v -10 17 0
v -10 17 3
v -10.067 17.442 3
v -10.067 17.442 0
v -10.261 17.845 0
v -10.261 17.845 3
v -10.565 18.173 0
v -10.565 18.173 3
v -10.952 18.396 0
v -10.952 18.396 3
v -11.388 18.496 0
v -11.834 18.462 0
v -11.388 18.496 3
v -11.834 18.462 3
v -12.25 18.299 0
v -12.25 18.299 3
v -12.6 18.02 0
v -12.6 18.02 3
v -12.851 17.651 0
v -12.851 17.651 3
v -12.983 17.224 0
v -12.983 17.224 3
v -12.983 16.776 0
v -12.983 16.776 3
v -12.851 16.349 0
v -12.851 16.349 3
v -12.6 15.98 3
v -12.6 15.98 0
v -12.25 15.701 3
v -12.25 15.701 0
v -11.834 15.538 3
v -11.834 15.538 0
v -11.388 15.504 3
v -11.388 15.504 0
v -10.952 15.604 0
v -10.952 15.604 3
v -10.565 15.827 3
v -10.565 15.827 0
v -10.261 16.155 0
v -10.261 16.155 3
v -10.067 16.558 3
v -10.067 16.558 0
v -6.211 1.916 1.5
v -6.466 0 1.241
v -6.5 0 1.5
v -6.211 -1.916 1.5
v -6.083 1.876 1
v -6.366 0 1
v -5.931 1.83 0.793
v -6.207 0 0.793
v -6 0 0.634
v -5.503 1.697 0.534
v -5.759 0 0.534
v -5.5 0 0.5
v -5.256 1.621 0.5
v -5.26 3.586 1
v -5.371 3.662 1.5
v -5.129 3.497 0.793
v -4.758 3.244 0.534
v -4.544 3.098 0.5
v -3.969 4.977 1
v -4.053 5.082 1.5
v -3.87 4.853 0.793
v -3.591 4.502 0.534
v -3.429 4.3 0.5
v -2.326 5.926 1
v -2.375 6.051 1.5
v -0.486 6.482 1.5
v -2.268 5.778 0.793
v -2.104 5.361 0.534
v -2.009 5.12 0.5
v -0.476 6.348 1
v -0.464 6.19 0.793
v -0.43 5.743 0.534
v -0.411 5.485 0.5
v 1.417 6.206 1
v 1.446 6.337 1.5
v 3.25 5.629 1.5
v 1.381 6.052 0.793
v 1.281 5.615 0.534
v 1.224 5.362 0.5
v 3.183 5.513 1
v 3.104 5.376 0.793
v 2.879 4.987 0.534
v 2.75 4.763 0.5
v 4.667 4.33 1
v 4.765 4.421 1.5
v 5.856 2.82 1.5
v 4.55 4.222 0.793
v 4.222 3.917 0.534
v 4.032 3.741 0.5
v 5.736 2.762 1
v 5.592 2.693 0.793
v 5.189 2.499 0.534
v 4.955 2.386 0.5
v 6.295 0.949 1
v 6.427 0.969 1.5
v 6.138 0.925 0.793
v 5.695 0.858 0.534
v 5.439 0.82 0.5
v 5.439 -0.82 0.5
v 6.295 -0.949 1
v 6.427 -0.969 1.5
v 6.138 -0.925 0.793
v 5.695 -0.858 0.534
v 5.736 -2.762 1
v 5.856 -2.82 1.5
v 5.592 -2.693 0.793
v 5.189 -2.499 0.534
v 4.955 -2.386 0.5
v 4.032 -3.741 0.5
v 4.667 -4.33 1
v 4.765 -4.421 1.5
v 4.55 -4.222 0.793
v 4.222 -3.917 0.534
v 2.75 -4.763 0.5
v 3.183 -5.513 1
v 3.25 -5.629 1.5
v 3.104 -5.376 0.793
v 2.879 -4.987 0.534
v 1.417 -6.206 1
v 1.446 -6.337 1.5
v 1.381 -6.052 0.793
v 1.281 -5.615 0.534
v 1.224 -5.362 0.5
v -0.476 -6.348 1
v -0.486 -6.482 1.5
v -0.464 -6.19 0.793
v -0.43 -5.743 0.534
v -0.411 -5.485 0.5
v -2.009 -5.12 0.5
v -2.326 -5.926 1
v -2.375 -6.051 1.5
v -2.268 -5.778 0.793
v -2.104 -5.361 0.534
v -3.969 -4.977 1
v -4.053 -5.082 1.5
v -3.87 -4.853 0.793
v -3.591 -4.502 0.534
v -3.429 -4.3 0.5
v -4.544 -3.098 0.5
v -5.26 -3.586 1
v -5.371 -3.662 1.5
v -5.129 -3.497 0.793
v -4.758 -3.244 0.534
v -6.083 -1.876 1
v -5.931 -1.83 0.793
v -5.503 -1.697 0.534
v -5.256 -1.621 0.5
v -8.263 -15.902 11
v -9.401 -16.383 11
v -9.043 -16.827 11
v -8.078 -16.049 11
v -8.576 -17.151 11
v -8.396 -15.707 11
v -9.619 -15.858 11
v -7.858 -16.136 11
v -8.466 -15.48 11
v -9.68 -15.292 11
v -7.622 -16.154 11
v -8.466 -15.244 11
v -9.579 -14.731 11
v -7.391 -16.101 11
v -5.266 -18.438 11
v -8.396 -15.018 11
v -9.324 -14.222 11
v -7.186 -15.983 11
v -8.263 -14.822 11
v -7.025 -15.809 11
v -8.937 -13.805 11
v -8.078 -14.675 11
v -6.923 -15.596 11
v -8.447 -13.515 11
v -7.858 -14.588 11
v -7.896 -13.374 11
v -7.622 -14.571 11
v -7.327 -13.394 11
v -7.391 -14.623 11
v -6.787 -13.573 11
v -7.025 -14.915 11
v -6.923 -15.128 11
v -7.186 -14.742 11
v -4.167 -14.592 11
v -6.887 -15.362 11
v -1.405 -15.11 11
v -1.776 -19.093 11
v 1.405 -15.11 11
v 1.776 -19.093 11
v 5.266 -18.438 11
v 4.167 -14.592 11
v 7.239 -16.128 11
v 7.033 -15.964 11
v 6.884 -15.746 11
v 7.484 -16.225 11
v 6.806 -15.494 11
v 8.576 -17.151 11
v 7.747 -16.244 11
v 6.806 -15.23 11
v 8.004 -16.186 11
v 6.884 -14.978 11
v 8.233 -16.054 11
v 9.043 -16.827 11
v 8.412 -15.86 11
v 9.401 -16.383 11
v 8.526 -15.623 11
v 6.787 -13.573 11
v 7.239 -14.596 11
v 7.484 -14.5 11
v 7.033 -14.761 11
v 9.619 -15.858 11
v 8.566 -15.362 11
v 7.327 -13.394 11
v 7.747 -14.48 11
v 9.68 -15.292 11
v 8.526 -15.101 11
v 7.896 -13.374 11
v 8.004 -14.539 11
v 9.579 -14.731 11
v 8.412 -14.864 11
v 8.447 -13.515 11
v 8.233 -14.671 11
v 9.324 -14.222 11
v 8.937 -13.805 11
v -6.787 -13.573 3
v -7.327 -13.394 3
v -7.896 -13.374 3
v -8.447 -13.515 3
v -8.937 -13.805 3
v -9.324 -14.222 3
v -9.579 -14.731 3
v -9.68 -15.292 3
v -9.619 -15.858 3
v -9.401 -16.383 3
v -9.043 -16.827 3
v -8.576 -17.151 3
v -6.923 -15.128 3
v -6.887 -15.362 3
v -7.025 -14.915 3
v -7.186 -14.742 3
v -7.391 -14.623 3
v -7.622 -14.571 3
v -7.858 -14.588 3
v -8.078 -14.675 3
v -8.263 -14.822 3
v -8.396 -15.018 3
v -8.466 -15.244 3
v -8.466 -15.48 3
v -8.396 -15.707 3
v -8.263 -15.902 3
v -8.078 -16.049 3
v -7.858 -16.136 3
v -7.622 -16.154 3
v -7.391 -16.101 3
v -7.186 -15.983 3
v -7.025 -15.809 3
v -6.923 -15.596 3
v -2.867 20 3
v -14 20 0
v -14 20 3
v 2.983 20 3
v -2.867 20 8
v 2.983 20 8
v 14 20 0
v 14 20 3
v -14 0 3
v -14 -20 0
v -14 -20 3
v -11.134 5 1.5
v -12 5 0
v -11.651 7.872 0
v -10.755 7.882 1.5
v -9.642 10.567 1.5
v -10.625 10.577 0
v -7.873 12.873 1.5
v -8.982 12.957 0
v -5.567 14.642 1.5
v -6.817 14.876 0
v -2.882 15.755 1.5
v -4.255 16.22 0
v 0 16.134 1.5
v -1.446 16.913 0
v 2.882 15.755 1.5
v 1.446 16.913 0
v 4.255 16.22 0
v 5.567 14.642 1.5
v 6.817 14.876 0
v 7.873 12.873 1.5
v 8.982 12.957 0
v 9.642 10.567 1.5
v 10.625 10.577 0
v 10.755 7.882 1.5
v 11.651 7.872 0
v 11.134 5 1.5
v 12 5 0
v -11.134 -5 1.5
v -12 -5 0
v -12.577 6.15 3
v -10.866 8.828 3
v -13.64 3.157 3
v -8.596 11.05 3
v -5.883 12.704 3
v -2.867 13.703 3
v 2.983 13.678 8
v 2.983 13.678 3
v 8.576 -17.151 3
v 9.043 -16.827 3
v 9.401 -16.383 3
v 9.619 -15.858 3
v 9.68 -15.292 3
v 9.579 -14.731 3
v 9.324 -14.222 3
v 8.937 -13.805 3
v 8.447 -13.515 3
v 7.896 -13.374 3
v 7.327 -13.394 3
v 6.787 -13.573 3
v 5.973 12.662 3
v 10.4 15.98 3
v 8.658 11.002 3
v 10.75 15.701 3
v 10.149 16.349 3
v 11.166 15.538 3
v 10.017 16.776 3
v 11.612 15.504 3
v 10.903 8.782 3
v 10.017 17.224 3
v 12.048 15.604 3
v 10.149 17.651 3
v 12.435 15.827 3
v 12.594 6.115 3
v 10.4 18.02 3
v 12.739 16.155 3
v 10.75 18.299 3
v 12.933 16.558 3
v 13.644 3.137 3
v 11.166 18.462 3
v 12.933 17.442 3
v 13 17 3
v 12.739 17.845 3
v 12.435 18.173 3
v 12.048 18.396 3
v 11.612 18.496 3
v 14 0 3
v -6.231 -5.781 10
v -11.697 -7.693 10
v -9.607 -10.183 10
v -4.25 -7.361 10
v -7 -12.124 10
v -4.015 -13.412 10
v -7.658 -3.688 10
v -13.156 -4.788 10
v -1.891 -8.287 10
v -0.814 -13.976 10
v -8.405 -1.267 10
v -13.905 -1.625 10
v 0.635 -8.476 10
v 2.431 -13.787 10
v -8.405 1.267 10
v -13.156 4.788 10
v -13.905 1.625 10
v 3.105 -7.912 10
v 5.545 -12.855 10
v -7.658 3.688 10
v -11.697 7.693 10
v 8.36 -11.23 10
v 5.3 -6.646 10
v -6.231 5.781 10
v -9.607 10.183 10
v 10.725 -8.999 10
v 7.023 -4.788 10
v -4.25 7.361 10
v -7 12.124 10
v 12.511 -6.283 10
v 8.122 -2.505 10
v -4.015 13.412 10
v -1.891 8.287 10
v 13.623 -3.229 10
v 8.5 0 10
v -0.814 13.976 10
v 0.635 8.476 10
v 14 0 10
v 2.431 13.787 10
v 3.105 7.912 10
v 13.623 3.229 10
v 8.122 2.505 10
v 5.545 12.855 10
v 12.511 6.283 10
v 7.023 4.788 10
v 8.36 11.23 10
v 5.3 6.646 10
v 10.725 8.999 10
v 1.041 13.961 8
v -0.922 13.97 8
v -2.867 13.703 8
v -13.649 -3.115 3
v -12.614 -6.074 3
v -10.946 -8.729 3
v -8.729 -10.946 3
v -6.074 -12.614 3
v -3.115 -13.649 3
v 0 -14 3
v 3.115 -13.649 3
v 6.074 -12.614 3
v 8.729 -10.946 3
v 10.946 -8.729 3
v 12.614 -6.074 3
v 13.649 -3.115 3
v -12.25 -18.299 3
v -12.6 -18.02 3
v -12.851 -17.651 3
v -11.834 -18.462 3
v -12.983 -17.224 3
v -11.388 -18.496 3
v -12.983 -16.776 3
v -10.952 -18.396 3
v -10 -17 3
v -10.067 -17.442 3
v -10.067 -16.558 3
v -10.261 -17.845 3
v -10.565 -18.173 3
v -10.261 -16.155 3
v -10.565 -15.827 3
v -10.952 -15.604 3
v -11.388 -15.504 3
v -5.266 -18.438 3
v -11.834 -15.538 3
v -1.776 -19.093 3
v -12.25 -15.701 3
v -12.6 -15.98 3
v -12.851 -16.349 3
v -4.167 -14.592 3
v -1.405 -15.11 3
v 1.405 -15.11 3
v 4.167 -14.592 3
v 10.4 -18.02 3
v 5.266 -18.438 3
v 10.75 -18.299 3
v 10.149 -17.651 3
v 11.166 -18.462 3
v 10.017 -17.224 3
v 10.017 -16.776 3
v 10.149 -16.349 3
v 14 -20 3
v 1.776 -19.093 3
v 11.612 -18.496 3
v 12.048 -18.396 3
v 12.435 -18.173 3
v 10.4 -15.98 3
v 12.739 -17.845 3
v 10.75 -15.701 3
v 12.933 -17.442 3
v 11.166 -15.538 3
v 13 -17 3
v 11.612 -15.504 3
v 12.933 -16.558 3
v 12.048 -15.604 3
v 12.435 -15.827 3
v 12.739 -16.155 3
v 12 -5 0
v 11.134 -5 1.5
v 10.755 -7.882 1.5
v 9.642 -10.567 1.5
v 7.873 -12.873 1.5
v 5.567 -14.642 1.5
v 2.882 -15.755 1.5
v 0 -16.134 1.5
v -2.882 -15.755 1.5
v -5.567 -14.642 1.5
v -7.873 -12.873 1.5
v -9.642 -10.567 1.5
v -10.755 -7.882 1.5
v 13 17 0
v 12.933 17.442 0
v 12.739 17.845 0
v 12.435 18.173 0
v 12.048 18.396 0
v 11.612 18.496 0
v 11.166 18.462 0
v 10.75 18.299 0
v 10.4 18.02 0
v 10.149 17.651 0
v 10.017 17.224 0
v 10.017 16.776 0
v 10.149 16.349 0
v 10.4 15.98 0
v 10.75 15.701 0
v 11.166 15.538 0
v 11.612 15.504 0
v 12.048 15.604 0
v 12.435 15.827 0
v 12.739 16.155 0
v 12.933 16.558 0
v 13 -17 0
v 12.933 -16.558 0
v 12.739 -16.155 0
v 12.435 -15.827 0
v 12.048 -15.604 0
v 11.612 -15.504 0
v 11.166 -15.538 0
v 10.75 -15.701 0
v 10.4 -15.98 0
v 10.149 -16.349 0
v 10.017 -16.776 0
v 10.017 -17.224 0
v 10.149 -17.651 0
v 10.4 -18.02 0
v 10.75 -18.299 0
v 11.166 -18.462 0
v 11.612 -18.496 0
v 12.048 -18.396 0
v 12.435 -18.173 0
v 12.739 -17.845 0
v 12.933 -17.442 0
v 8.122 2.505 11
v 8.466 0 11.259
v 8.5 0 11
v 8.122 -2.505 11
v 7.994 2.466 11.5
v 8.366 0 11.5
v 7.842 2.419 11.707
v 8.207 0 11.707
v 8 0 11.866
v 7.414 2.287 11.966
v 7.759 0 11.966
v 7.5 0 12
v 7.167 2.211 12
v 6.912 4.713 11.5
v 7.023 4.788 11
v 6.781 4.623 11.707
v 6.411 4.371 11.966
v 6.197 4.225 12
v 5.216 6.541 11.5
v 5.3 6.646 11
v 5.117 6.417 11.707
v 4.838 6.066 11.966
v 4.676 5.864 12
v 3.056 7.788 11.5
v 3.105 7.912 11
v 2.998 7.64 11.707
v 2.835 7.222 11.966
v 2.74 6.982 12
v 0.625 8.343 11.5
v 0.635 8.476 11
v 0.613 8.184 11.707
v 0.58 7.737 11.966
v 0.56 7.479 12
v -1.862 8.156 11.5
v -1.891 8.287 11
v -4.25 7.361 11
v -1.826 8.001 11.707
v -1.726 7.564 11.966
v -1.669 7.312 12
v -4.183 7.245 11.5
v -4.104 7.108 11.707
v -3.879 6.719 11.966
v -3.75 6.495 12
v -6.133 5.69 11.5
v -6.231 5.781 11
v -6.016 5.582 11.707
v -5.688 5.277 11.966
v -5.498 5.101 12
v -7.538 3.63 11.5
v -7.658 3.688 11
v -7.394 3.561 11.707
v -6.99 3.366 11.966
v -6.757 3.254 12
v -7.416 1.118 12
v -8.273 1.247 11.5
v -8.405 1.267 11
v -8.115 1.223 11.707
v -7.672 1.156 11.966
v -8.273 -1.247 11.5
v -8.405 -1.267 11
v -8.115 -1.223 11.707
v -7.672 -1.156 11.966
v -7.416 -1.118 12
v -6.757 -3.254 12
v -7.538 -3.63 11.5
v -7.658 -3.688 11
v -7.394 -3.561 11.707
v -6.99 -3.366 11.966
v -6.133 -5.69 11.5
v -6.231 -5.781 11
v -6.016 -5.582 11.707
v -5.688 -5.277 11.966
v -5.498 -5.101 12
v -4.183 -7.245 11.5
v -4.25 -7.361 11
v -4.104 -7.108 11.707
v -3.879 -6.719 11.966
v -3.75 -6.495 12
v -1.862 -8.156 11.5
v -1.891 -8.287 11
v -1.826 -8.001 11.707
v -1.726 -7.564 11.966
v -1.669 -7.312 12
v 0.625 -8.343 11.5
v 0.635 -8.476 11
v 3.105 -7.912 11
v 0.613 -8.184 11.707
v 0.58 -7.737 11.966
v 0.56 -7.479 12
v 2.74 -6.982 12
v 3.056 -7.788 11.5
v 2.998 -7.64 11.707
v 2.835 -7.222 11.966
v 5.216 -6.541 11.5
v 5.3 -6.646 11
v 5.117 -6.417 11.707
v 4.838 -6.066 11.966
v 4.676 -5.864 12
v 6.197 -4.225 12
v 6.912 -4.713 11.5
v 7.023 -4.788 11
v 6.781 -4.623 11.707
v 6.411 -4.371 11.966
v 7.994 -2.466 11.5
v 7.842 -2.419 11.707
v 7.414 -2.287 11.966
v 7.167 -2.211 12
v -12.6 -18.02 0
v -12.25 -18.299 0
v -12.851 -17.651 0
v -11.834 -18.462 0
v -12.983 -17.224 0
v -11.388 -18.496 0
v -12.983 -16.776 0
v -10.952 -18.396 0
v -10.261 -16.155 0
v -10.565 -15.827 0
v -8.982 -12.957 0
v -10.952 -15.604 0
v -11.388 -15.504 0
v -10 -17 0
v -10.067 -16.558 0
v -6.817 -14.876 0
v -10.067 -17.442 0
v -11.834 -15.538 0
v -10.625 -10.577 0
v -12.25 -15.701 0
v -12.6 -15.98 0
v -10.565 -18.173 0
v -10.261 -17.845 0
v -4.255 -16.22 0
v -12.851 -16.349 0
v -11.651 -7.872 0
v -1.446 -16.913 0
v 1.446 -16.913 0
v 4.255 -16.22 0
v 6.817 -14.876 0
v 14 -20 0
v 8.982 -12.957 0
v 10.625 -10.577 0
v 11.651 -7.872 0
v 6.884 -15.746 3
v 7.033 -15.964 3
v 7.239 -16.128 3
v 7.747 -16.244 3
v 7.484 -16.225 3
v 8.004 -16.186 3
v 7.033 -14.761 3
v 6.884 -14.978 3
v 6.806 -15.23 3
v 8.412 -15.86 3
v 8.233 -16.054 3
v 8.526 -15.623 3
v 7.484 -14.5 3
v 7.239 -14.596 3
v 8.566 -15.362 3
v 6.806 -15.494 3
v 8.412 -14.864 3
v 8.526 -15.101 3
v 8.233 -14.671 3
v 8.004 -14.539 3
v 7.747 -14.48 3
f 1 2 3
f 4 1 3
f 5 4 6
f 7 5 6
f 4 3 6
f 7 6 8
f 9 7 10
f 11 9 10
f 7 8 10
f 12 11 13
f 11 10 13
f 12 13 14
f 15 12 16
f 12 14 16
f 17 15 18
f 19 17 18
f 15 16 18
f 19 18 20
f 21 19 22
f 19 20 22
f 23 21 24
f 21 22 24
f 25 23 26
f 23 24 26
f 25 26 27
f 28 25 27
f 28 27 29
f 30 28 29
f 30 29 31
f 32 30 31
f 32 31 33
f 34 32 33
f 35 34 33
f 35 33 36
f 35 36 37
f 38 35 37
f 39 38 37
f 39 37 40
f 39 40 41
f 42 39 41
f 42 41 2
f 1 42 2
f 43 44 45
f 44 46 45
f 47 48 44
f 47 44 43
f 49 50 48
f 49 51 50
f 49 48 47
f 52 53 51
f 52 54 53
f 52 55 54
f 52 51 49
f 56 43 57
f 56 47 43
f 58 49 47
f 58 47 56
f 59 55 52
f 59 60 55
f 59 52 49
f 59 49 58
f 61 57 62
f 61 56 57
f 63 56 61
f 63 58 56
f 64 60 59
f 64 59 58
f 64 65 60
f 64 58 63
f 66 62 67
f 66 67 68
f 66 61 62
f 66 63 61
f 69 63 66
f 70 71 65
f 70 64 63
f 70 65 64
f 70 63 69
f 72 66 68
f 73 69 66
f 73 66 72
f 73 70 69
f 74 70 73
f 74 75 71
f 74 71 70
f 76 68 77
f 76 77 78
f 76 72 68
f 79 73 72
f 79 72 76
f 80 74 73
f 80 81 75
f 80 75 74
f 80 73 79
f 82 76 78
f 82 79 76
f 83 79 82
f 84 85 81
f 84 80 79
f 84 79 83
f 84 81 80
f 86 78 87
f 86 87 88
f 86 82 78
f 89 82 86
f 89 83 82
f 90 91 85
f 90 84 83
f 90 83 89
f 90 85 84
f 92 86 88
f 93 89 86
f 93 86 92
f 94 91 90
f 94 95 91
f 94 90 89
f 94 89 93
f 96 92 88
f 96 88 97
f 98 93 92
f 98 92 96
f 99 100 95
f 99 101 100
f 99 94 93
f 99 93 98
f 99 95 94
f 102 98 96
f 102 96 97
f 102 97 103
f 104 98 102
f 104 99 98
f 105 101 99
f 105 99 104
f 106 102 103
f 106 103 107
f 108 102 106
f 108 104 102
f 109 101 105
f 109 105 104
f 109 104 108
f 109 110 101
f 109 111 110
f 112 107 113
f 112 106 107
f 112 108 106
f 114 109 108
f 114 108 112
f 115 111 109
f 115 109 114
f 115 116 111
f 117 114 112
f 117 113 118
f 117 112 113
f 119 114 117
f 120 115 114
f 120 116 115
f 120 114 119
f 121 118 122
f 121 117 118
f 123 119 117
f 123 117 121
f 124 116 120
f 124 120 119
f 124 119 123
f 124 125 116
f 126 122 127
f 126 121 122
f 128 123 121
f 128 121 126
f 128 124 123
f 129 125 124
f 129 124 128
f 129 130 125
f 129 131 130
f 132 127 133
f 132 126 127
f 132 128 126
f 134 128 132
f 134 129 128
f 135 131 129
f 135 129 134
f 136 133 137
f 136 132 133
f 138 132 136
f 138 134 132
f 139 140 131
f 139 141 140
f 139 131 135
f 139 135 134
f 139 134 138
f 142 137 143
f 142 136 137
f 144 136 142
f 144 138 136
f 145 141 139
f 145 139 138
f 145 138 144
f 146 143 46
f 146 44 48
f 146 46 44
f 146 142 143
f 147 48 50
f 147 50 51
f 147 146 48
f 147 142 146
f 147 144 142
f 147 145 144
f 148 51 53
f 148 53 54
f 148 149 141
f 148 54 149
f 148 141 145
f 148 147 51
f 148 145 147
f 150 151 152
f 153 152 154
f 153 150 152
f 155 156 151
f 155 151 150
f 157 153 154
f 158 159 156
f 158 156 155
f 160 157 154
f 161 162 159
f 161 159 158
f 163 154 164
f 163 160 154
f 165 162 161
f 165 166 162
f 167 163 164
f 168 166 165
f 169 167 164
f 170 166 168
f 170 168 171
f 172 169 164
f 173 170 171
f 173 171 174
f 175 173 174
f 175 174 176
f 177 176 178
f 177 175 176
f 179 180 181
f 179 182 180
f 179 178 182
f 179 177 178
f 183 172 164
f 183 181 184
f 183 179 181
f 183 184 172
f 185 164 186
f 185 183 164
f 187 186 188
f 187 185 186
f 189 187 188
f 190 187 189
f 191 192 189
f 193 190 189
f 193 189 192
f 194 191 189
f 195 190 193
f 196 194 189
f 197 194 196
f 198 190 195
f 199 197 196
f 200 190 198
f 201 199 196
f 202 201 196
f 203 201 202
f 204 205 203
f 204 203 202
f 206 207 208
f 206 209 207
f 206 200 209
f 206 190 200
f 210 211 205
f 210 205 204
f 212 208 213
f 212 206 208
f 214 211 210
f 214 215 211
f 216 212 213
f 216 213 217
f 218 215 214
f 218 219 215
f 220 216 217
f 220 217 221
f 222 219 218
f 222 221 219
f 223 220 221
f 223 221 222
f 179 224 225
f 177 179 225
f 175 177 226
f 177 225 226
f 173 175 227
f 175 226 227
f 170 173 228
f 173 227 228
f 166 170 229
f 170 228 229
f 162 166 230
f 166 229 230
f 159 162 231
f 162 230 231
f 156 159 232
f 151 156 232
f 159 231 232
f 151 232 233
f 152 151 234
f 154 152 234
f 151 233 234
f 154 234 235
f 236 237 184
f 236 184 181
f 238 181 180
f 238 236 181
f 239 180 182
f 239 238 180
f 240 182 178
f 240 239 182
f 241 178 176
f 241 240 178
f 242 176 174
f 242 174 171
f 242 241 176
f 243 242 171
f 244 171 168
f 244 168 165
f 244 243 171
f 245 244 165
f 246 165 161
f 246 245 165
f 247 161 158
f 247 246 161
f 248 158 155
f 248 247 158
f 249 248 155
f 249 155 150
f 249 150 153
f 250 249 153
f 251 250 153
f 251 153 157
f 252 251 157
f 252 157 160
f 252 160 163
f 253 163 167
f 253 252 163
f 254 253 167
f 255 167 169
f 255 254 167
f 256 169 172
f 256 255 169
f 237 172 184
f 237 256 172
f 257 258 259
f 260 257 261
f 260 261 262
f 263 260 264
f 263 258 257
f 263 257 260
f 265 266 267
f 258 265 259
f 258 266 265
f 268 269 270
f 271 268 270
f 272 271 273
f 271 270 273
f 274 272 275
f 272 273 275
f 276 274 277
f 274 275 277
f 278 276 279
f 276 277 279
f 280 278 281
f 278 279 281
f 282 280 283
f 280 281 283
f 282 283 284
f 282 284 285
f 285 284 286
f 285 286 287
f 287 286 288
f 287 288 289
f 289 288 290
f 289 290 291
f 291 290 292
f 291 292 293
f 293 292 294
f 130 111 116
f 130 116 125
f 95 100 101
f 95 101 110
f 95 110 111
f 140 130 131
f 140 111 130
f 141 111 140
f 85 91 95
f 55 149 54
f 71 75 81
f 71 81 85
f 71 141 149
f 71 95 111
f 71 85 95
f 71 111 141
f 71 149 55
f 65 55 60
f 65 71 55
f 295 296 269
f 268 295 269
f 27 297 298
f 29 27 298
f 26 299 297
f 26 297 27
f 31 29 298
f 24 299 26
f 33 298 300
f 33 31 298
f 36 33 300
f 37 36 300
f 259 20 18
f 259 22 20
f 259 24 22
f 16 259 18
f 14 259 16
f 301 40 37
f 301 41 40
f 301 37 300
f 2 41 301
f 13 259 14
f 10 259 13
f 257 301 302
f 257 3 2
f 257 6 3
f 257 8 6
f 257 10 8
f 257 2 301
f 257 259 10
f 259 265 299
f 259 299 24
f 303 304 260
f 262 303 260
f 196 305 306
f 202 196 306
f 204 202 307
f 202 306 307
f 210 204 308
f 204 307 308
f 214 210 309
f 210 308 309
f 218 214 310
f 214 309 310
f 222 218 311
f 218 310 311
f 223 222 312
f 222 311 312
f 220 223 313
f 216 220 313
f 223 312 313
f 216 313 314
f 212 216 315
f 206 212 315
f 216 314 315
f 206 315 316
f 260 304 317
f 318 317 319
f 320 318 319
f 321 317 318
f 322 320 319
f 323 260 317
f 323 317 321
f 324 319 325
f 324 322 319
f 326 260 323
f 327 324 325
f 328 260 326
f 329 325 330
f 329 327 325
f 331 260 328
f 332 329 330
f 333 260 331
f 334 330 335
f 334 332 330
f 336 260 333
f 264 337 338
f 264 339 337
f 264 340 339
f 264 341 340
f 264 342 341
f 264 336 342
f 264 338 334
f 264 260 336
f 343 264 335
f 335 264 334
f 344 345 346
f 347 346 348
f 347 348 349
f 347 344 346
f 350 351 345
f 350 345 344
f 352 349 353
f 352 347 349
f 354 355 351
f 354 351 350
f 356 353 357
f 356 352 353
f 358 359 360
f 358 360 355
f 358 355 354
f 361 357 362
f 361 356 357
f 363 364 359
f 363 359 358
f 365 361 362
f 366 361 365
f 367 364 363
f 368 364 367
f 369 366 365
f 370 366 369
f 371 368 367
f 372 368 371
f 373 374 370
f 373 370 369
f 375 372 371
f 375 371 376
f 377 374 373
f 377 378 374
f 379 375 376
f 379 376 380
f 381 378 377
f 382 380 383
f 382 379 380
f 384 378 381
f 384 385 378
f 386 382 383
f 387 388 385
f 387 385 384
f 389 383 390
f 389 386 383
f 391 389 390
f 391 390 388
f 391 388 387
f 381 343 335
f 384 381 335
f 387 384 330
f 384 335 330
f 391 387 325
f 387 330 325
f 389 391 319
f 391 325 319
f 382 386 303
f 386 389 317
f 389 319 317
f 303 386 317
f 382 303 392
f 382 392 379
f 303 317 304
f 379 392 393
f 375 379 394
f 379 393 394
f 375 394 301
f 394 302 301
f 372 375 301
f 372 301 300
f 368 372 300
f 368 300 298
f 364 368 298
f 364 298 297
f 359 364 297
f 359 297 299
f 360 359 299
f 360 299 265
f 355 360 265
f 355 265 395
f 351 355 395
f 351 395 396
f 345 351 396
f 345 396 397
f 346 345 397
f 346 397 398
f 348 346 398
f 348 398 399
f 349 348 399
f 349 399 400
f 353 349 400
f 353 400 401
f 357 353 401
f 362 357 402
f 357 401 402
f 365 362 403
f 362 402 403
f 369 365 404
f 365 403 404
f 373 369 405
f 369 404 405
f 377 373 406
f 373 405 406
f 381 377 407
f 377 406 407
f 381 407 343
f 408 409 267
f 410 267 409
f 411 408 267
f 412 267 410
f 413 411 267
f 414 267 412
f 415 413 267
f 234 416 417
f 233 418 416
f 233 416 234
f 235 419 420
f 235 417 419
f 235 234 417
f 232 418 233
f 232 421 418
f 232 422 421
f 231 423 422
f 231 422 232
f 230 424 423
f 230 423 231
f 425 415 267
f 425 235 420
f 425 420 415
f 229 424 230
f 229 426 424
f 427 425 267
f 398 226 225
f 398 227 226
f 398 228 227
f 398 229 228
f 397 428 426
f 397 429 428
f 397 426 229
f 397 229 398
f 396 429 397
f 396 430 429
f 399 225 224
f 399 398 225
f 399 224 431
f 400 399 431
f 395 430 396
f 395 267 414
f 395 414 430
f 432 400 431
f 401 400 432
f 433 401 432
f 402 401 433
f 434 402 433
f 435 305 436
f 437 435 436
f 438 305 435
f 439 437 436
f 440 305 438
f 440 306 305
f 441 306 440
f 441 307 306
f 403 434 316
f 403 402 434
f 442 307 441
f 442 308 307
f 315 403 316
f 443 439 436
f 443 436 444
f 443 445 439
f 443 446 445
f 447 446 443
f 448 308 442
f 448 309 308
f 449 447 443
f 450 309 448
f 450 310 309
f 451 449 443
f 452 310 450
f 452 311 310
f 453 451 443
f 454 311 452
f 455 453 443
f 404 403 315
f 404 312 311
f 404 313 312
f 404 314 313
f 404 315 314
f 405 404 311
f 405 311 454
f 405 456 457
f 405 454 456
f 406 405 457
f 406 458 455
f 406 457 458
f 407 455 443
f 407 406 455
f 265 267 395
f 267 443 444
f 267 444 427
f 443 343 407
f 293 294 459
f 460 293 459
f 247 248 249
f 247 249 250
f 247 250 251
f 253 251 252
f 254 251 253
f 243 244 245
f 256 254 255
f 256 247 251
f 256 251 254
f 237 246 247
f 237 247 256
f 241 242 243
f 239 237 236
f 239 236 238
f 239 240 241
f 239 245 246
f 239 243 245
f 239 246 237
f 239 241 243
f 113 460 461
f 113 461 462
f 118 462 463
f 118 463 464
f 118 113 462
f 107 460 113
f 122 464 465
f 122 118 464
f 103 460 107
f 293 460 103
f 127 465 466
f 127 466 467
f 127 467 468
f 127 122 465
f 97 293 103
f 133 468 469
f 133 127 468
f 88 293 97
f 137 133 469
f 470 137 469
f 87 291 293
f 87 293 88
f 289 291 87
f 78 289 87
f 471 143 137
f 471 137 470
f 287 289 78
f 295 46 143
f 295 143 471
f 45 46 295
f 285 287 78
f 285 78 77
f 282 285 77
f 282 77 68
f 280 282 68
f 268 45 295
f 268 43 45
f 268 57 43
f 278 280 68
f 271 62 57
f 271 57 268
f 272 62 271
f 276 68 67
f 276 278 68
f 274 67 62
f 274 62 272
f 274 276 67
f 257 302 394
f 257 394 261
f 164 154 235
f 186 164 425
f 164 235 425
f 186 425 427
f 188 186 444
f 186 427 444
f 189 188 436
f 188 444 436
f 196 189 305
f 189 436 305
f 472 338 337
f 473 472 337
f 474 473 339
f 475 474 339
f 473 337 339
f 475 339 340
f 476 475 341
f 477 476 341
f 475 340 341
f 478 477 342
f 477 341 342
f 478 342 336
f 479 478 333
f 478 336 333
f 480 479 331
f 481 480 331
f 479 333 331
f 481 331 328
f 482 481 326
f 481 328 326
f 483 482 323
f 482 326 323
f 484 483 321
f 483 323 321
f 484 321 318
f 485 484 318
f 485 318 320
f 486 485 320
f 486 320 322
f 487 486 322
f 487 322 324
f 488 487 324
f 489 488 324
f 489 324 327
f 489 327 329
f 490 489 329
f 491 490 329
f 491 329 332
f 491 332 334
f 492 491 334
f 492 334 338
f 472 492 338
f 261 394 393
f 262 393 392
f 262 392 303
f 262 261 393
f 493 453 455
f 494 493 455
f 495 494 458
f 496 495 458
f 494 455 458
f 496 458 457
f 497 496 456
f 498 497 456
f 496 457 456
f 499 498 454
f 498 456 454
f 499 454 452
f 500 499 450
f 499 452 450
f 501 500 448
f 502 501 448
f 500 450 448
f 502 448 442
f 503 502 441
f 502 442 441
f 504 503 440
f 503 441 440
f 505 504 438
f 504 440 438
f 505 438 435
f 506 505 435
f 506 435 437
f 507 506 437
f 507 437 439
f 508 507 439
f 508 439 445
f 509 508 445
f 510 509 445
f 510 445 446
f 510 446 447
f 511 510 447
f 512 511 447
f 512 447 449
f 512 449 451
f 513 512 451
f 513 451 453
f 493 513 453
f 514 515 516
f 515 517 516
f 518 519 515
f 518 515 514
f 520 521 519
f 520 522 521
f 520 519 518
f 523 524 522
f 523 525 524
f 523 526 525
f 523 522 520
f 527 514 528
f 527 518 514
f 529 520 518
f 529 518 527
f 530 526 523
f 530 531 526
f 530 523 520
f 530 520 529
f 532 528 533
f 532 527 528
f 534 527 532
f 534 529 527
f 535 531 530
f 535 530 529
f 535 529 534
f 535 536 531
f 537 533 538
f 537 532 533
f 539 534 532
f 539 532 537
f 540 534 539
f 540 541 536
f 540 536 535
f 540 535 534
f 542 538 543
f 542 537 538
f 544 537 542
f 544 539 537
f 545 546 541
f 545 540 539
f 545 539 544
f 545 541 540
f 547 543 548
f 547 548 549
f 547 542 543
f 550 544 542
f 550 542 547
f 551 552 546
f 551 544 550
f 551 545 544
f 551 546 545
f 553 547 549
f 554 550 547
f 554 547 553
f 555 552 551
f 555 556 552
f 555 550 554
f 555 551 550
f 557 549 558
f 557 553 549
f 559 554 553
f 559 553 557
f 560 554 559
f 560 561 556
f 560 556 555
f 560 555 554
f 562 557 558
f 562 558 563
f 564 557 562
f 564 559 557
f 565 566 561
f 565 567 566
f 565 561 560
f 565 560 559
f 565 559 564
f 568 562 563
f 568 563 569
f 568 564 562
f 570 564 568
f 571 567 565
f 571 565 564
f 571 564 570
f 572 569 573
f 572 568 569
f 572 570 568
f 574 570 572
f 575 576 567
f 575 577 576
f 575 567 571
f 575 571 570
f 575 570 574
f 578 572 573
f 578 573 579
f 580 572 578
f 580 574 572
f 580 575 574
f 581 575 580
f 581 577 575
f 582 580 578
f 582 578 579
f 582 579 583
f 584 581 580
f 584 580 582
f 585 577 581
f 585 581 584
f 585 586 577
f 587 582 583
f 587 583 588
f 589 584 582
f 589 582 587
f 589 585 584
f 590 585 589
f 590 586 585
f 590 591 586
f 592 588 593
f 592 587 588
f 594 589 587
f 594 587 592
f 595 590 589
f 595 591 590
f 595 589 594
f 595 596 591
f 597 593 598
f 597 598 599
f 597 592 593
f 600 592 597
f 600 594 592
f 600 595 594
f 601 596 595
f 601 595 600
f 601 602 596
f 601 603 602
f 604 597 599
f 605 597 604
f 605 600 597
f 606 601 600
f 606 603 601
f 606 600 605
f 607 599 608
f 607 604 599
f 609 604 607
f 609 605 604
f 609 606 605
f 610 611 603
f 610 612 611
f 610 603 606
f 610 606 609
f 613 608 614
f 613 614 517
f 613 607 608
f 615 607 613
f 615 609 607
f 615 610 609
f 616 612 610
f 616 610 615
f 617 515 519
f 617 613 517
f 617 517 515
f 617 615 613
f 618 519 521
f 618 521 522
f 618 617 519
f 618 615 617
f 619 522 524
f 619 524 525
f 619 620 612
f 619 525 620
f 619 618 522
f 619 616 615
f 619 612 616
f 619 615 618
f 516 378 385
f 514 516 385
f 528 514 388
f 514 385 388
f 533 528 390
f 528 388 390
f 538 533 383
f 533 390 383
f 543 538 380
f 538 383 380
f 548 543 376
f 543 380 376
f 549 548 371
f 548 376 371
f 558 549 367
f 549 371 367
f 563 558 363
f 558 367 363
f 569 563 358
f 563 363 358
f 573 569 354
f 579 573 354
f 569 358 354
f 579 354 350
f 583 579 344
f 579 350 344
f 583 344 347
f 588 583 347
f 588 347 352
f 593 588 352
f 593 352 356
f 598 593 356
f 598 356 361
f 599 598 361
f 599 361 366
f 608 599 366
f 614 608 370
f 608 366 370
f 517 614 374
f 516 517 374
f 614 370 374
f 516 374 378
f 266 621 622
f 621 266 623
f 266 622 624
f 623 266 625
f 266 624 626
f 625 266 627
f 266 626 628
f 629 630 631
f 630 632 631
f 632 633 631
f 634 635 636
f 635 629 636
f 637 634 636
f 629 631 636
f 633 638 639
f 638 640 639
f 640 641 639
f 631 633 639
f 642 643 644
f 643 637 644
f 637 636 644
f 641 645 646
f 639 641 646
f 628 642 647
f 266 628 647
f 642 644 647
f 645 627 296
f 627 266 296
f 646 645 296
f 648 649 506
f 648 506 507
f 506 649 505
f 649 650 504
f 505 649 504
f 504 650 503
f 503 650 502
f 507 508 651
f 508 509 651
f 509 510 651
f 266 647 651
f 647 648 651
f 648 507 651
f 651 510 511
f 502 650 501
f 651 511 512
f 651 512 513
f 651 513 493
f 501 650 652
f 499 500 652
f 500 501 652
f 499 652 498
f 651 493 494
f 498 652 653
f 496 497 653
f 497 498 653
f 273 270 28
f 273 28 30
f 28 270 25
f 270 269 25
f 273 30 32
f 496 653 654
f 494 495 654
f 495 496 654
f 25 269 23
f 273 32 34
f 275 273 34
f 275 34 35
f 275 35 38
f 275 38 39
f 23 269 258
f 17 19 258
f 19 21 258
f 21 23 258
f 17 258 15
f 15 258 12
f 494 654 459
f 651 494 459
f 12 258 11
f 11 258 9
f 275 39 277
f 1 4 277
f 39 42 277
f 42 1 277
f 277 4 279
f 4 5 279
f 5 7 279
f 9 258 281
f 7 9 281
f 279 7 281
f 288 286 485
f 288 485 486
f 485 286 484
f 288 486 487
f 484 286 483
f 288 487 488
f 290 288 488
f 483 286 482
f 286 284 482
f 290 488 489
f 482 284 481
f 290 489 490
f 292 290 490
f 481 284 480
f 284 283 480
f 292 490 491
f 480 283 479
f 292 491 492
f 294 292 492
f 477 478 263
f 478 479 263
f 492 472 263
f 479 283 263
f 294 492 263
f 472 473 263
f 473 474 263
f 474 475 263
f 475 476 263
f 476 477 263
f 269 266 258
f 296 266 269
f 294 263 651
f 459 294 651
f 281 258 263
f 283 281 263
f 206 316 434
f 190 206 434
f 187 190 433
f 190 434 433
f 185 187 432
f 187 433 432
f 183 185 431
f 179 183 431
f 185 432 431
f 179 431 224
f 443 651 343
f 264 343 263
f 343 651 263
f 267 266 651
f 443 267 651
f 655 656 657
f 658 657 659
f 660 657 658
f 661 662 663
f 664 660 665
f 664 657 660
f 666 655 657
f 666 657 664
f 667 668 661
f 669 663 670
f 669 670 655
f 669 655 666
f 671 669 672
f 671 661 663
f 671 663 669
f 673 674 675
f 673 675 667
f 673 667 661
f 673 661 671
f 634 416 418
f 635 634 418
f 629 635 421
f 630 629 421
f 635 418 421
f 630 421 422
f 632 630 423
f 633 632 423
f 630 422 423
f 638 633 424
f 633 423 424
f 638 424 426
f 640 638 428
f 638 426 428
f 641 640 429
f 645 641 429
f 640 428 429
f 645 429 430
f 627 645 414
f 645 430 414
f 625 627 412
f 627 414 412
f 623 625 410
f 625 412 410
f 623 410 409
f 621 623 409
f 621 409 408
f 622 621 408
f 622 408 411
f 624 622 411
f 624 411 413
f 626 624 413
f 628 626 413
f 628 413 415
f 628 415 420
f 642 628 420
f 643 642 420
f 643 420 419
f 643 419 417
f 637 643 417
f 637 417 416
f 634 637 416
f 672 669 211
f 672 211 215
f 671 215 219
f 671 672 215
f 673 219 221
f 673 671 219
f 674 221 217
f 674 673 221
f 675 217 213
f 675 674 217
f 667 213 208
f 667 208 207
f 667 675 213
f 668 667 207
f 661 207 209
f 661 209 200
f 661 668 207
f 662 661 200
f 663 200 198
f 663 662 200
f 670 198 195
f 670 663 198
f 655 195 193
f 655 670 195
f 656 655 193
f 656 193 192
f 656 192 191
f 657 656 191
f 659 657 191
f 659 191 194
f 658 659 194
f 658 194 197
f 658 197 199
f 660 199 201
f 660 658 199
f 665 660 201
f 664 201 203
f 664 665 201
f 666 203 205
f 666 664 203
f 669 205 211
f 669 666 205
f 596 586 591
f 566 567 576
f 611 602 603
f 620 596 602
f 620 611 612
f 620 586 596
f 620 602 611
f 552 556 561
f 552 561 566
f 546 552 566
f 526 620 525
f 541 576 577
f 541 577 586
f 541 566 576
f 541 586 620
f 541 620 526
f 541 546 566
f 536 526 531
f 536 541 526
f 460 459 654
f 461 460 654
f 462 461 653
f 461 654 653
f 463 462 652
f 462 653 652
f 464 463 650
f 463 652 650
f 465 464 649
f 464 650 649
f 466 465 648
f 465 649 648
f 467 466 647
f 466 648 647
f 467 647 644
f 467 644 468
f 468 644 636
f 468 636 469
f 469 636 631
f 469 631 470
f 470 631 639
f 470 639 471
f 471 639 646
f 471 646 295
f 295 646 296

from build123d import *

# Parameters (mm, degrees)
SKETCH1_W           = 28
SKETCH1_H           = 40
BOSS_EXTRUDE1_DEPTH = 3
SKETCH2_R           = 14
BOSS_EXTRUDE2_DEPTH = 7
SKETCH3_R           = 8.5
BOSS_EXTRUDE3_DEPTH = 2
FILLET1_R           = 1
SKETCH4_R           = 0.884555984
SKETCH4_R_2         = 0.79363575
BOSS_EXTRUDE4_DEPTH = 8
SKETCH5_W           = 5.850646162
SKETCH5_H           = 7.111200286
BOSS_EXTRUDE5_DEPTH = 5
SKETCH6_R           = 1.5
CUT_EXTRUDE1_DEPTH  = 5
CUT_EXTRUDE2_DEPTH  = 1.5
CUT_EXTRUDE2_DRAFT  = -30
SKETCH8_R           = 6.5
BOSS_EXTRUDE6_DEPTH = 1
FILLET2_R           = 1


with BuildPart() as part:
    # Sketch1 → Boss-Extrude1 (new body)
    with BuildSketch(Plane.XY):
        Rectangle(SKETCH1_W, SKETCH1_H)
    extrude(amount=BOSS_EXTRUDE1_DEPTH)

    # Sketch2 → Boss-Extrude2 (add)
    with BuildSketch(Plane.XY.offset(3)):
        Circle(SKETCH2_R)
    extrude(amount=BOSS_EXTRUDE2_DEPTH)

    # Sketch3 → Boss-Extrude3 (add)
    with BuildSketch(Plane.XY.offset(10)):
        Circle(SKETCH3_R)
    extrude(amount=BOSS_EXTRUDE3_DEPTH)

    # Fillet1
    fillet1_edges = [part.edges().sort_by_distance(p)[0] for p in [
        (-8.5, 0, 12),
    ]]
    fillet(fillet1_edges, radius=FILLET1_R)

    # Sketch4 → Boss-Extrude4 (add)
    with BuildSketch(Plane.XY.offset(3)):
        with BuildLine():
            ThreePointArc((-8.575515757, -17.151031514), (0, -19.175436175), (8.575515757, -17.151031514))
            ThreePointArc((8.575515757, -17.151031514), (9.469942948, -14.467749941), (6.786661375, -13.57332275))
            ThreePointArc((6.786661375, -13.57332275), (0, -15.175436175), (-6.786661375, -13.57332275))
            ThreePointArc((-6.786661375, -13.57332275), (-9.469942948, -14.467749941), (-8.575515757, -17.151031514))
        make_face()
        with Locations((7.681088566, -15.362177132)):
            Circle(SKETCH4_R, mode=Mode.SUBTRACT)
        with Locations((-7.681088566, -15.362177132)):
            Circle(SKETCH4_R_2, mode=Mode.SUBTRACT)
    extrude(amount=BOSS_EXTRUDE4_DEPTH)

    # Sketch5 → Boss-Extrude5 (add)
    with BuildSketch(Plane.XY.offset(3)):
        with Locations((0.05792719, 16.444399857)):
            Rectangle(SKETCH5_W, SKETCH5_H)
    extrude(amount=BOSS_EXTRUDE5_DEPTH)

    # Sketch6 → Cut-Extrude1 (cut)
    with BuildSketch(Plane.XY.offset(3)):
        with Locations((-11.5, 17)):
            Circle(SKETCH6_R)
        with Locations((11.5, 17)):
            Circle(SKETCH6_R)
        with Locations((11.5, -17)):
            Circle(SKETCH6_R)
        with Locations((-11.5, -17)):
            Circle(SKETCH6_R)
    extrude(amount=-CUT_EXTRUDE1_DEPTH, mode=Mode.SUBTRACT)


with BuildPart() as cut_extrude2_tool:
    # Sketch7 → Cut-Extrude2 (with draft: the straight prism first)
    with BuildSketch(Plane(origin=(0, 0, 0), x_dir=(-1, 0, 0), z_dir=(0, 0, -1))):
        with BuildLine():
            ThreePointArc((-12, -5), (0, -17), (12, -5))
            Line((12, -5), (12, 5))
            ThreePointArc((12, 5), (0, 17), (-12, 5))
            Line((-12, 5), (-12, -5))
        make_face()
    extrude(amount=-CUT_EXTRUDE2_DEPTH)
    # Cut-Extrude2: the draft: its side faces are tilted about the plane it starts from
    cut_extrude2_sides = [cut_extrude2_tool.faces().sort_by_distance(p)[0] for p in [
        (-12, 0, 0.75),
        (0, 17, 0.75),
        (12, 0, 0.75),
        (0, -17, 0.75),
    ]]
    draft(cut_extrude2_sides, Plane(origin=(0, 0, 0), x_dir=(-1, 0, 0), z_dir=(0, 0, -1)), CUT_EXTRUDE2_DRAFT)


with BuildPart() as part_1:
    add(part.part)

    # Cut-Extrude2: cut by cut_extrude2_tool
    add(cut_extrude2_tool.part, mode=Mode.SUBTRACT)

    # Sketch8 → Boss-Extrude6 (add)
    with BuildSketch(Plane(origin=(0, 0, 1.5), x_dir=(-1, 0, 0), z_dir=(0, 0, -1))):
        Circle(SKETCH8_R)
    extrude(amount=BOSS_EXTRUDE6_DEPTH)

    # Fillet2
    fillet2_edges = [part_1.edges().sort_by_distance(p)[0] for p in [
        (6.5, 0, 0.5),
    ]]
    fillet(fillet2_edges, radius=FILLET2_R - 0.0001)  # a hair under: the kernel refuses the full size


solid = part_1.part
